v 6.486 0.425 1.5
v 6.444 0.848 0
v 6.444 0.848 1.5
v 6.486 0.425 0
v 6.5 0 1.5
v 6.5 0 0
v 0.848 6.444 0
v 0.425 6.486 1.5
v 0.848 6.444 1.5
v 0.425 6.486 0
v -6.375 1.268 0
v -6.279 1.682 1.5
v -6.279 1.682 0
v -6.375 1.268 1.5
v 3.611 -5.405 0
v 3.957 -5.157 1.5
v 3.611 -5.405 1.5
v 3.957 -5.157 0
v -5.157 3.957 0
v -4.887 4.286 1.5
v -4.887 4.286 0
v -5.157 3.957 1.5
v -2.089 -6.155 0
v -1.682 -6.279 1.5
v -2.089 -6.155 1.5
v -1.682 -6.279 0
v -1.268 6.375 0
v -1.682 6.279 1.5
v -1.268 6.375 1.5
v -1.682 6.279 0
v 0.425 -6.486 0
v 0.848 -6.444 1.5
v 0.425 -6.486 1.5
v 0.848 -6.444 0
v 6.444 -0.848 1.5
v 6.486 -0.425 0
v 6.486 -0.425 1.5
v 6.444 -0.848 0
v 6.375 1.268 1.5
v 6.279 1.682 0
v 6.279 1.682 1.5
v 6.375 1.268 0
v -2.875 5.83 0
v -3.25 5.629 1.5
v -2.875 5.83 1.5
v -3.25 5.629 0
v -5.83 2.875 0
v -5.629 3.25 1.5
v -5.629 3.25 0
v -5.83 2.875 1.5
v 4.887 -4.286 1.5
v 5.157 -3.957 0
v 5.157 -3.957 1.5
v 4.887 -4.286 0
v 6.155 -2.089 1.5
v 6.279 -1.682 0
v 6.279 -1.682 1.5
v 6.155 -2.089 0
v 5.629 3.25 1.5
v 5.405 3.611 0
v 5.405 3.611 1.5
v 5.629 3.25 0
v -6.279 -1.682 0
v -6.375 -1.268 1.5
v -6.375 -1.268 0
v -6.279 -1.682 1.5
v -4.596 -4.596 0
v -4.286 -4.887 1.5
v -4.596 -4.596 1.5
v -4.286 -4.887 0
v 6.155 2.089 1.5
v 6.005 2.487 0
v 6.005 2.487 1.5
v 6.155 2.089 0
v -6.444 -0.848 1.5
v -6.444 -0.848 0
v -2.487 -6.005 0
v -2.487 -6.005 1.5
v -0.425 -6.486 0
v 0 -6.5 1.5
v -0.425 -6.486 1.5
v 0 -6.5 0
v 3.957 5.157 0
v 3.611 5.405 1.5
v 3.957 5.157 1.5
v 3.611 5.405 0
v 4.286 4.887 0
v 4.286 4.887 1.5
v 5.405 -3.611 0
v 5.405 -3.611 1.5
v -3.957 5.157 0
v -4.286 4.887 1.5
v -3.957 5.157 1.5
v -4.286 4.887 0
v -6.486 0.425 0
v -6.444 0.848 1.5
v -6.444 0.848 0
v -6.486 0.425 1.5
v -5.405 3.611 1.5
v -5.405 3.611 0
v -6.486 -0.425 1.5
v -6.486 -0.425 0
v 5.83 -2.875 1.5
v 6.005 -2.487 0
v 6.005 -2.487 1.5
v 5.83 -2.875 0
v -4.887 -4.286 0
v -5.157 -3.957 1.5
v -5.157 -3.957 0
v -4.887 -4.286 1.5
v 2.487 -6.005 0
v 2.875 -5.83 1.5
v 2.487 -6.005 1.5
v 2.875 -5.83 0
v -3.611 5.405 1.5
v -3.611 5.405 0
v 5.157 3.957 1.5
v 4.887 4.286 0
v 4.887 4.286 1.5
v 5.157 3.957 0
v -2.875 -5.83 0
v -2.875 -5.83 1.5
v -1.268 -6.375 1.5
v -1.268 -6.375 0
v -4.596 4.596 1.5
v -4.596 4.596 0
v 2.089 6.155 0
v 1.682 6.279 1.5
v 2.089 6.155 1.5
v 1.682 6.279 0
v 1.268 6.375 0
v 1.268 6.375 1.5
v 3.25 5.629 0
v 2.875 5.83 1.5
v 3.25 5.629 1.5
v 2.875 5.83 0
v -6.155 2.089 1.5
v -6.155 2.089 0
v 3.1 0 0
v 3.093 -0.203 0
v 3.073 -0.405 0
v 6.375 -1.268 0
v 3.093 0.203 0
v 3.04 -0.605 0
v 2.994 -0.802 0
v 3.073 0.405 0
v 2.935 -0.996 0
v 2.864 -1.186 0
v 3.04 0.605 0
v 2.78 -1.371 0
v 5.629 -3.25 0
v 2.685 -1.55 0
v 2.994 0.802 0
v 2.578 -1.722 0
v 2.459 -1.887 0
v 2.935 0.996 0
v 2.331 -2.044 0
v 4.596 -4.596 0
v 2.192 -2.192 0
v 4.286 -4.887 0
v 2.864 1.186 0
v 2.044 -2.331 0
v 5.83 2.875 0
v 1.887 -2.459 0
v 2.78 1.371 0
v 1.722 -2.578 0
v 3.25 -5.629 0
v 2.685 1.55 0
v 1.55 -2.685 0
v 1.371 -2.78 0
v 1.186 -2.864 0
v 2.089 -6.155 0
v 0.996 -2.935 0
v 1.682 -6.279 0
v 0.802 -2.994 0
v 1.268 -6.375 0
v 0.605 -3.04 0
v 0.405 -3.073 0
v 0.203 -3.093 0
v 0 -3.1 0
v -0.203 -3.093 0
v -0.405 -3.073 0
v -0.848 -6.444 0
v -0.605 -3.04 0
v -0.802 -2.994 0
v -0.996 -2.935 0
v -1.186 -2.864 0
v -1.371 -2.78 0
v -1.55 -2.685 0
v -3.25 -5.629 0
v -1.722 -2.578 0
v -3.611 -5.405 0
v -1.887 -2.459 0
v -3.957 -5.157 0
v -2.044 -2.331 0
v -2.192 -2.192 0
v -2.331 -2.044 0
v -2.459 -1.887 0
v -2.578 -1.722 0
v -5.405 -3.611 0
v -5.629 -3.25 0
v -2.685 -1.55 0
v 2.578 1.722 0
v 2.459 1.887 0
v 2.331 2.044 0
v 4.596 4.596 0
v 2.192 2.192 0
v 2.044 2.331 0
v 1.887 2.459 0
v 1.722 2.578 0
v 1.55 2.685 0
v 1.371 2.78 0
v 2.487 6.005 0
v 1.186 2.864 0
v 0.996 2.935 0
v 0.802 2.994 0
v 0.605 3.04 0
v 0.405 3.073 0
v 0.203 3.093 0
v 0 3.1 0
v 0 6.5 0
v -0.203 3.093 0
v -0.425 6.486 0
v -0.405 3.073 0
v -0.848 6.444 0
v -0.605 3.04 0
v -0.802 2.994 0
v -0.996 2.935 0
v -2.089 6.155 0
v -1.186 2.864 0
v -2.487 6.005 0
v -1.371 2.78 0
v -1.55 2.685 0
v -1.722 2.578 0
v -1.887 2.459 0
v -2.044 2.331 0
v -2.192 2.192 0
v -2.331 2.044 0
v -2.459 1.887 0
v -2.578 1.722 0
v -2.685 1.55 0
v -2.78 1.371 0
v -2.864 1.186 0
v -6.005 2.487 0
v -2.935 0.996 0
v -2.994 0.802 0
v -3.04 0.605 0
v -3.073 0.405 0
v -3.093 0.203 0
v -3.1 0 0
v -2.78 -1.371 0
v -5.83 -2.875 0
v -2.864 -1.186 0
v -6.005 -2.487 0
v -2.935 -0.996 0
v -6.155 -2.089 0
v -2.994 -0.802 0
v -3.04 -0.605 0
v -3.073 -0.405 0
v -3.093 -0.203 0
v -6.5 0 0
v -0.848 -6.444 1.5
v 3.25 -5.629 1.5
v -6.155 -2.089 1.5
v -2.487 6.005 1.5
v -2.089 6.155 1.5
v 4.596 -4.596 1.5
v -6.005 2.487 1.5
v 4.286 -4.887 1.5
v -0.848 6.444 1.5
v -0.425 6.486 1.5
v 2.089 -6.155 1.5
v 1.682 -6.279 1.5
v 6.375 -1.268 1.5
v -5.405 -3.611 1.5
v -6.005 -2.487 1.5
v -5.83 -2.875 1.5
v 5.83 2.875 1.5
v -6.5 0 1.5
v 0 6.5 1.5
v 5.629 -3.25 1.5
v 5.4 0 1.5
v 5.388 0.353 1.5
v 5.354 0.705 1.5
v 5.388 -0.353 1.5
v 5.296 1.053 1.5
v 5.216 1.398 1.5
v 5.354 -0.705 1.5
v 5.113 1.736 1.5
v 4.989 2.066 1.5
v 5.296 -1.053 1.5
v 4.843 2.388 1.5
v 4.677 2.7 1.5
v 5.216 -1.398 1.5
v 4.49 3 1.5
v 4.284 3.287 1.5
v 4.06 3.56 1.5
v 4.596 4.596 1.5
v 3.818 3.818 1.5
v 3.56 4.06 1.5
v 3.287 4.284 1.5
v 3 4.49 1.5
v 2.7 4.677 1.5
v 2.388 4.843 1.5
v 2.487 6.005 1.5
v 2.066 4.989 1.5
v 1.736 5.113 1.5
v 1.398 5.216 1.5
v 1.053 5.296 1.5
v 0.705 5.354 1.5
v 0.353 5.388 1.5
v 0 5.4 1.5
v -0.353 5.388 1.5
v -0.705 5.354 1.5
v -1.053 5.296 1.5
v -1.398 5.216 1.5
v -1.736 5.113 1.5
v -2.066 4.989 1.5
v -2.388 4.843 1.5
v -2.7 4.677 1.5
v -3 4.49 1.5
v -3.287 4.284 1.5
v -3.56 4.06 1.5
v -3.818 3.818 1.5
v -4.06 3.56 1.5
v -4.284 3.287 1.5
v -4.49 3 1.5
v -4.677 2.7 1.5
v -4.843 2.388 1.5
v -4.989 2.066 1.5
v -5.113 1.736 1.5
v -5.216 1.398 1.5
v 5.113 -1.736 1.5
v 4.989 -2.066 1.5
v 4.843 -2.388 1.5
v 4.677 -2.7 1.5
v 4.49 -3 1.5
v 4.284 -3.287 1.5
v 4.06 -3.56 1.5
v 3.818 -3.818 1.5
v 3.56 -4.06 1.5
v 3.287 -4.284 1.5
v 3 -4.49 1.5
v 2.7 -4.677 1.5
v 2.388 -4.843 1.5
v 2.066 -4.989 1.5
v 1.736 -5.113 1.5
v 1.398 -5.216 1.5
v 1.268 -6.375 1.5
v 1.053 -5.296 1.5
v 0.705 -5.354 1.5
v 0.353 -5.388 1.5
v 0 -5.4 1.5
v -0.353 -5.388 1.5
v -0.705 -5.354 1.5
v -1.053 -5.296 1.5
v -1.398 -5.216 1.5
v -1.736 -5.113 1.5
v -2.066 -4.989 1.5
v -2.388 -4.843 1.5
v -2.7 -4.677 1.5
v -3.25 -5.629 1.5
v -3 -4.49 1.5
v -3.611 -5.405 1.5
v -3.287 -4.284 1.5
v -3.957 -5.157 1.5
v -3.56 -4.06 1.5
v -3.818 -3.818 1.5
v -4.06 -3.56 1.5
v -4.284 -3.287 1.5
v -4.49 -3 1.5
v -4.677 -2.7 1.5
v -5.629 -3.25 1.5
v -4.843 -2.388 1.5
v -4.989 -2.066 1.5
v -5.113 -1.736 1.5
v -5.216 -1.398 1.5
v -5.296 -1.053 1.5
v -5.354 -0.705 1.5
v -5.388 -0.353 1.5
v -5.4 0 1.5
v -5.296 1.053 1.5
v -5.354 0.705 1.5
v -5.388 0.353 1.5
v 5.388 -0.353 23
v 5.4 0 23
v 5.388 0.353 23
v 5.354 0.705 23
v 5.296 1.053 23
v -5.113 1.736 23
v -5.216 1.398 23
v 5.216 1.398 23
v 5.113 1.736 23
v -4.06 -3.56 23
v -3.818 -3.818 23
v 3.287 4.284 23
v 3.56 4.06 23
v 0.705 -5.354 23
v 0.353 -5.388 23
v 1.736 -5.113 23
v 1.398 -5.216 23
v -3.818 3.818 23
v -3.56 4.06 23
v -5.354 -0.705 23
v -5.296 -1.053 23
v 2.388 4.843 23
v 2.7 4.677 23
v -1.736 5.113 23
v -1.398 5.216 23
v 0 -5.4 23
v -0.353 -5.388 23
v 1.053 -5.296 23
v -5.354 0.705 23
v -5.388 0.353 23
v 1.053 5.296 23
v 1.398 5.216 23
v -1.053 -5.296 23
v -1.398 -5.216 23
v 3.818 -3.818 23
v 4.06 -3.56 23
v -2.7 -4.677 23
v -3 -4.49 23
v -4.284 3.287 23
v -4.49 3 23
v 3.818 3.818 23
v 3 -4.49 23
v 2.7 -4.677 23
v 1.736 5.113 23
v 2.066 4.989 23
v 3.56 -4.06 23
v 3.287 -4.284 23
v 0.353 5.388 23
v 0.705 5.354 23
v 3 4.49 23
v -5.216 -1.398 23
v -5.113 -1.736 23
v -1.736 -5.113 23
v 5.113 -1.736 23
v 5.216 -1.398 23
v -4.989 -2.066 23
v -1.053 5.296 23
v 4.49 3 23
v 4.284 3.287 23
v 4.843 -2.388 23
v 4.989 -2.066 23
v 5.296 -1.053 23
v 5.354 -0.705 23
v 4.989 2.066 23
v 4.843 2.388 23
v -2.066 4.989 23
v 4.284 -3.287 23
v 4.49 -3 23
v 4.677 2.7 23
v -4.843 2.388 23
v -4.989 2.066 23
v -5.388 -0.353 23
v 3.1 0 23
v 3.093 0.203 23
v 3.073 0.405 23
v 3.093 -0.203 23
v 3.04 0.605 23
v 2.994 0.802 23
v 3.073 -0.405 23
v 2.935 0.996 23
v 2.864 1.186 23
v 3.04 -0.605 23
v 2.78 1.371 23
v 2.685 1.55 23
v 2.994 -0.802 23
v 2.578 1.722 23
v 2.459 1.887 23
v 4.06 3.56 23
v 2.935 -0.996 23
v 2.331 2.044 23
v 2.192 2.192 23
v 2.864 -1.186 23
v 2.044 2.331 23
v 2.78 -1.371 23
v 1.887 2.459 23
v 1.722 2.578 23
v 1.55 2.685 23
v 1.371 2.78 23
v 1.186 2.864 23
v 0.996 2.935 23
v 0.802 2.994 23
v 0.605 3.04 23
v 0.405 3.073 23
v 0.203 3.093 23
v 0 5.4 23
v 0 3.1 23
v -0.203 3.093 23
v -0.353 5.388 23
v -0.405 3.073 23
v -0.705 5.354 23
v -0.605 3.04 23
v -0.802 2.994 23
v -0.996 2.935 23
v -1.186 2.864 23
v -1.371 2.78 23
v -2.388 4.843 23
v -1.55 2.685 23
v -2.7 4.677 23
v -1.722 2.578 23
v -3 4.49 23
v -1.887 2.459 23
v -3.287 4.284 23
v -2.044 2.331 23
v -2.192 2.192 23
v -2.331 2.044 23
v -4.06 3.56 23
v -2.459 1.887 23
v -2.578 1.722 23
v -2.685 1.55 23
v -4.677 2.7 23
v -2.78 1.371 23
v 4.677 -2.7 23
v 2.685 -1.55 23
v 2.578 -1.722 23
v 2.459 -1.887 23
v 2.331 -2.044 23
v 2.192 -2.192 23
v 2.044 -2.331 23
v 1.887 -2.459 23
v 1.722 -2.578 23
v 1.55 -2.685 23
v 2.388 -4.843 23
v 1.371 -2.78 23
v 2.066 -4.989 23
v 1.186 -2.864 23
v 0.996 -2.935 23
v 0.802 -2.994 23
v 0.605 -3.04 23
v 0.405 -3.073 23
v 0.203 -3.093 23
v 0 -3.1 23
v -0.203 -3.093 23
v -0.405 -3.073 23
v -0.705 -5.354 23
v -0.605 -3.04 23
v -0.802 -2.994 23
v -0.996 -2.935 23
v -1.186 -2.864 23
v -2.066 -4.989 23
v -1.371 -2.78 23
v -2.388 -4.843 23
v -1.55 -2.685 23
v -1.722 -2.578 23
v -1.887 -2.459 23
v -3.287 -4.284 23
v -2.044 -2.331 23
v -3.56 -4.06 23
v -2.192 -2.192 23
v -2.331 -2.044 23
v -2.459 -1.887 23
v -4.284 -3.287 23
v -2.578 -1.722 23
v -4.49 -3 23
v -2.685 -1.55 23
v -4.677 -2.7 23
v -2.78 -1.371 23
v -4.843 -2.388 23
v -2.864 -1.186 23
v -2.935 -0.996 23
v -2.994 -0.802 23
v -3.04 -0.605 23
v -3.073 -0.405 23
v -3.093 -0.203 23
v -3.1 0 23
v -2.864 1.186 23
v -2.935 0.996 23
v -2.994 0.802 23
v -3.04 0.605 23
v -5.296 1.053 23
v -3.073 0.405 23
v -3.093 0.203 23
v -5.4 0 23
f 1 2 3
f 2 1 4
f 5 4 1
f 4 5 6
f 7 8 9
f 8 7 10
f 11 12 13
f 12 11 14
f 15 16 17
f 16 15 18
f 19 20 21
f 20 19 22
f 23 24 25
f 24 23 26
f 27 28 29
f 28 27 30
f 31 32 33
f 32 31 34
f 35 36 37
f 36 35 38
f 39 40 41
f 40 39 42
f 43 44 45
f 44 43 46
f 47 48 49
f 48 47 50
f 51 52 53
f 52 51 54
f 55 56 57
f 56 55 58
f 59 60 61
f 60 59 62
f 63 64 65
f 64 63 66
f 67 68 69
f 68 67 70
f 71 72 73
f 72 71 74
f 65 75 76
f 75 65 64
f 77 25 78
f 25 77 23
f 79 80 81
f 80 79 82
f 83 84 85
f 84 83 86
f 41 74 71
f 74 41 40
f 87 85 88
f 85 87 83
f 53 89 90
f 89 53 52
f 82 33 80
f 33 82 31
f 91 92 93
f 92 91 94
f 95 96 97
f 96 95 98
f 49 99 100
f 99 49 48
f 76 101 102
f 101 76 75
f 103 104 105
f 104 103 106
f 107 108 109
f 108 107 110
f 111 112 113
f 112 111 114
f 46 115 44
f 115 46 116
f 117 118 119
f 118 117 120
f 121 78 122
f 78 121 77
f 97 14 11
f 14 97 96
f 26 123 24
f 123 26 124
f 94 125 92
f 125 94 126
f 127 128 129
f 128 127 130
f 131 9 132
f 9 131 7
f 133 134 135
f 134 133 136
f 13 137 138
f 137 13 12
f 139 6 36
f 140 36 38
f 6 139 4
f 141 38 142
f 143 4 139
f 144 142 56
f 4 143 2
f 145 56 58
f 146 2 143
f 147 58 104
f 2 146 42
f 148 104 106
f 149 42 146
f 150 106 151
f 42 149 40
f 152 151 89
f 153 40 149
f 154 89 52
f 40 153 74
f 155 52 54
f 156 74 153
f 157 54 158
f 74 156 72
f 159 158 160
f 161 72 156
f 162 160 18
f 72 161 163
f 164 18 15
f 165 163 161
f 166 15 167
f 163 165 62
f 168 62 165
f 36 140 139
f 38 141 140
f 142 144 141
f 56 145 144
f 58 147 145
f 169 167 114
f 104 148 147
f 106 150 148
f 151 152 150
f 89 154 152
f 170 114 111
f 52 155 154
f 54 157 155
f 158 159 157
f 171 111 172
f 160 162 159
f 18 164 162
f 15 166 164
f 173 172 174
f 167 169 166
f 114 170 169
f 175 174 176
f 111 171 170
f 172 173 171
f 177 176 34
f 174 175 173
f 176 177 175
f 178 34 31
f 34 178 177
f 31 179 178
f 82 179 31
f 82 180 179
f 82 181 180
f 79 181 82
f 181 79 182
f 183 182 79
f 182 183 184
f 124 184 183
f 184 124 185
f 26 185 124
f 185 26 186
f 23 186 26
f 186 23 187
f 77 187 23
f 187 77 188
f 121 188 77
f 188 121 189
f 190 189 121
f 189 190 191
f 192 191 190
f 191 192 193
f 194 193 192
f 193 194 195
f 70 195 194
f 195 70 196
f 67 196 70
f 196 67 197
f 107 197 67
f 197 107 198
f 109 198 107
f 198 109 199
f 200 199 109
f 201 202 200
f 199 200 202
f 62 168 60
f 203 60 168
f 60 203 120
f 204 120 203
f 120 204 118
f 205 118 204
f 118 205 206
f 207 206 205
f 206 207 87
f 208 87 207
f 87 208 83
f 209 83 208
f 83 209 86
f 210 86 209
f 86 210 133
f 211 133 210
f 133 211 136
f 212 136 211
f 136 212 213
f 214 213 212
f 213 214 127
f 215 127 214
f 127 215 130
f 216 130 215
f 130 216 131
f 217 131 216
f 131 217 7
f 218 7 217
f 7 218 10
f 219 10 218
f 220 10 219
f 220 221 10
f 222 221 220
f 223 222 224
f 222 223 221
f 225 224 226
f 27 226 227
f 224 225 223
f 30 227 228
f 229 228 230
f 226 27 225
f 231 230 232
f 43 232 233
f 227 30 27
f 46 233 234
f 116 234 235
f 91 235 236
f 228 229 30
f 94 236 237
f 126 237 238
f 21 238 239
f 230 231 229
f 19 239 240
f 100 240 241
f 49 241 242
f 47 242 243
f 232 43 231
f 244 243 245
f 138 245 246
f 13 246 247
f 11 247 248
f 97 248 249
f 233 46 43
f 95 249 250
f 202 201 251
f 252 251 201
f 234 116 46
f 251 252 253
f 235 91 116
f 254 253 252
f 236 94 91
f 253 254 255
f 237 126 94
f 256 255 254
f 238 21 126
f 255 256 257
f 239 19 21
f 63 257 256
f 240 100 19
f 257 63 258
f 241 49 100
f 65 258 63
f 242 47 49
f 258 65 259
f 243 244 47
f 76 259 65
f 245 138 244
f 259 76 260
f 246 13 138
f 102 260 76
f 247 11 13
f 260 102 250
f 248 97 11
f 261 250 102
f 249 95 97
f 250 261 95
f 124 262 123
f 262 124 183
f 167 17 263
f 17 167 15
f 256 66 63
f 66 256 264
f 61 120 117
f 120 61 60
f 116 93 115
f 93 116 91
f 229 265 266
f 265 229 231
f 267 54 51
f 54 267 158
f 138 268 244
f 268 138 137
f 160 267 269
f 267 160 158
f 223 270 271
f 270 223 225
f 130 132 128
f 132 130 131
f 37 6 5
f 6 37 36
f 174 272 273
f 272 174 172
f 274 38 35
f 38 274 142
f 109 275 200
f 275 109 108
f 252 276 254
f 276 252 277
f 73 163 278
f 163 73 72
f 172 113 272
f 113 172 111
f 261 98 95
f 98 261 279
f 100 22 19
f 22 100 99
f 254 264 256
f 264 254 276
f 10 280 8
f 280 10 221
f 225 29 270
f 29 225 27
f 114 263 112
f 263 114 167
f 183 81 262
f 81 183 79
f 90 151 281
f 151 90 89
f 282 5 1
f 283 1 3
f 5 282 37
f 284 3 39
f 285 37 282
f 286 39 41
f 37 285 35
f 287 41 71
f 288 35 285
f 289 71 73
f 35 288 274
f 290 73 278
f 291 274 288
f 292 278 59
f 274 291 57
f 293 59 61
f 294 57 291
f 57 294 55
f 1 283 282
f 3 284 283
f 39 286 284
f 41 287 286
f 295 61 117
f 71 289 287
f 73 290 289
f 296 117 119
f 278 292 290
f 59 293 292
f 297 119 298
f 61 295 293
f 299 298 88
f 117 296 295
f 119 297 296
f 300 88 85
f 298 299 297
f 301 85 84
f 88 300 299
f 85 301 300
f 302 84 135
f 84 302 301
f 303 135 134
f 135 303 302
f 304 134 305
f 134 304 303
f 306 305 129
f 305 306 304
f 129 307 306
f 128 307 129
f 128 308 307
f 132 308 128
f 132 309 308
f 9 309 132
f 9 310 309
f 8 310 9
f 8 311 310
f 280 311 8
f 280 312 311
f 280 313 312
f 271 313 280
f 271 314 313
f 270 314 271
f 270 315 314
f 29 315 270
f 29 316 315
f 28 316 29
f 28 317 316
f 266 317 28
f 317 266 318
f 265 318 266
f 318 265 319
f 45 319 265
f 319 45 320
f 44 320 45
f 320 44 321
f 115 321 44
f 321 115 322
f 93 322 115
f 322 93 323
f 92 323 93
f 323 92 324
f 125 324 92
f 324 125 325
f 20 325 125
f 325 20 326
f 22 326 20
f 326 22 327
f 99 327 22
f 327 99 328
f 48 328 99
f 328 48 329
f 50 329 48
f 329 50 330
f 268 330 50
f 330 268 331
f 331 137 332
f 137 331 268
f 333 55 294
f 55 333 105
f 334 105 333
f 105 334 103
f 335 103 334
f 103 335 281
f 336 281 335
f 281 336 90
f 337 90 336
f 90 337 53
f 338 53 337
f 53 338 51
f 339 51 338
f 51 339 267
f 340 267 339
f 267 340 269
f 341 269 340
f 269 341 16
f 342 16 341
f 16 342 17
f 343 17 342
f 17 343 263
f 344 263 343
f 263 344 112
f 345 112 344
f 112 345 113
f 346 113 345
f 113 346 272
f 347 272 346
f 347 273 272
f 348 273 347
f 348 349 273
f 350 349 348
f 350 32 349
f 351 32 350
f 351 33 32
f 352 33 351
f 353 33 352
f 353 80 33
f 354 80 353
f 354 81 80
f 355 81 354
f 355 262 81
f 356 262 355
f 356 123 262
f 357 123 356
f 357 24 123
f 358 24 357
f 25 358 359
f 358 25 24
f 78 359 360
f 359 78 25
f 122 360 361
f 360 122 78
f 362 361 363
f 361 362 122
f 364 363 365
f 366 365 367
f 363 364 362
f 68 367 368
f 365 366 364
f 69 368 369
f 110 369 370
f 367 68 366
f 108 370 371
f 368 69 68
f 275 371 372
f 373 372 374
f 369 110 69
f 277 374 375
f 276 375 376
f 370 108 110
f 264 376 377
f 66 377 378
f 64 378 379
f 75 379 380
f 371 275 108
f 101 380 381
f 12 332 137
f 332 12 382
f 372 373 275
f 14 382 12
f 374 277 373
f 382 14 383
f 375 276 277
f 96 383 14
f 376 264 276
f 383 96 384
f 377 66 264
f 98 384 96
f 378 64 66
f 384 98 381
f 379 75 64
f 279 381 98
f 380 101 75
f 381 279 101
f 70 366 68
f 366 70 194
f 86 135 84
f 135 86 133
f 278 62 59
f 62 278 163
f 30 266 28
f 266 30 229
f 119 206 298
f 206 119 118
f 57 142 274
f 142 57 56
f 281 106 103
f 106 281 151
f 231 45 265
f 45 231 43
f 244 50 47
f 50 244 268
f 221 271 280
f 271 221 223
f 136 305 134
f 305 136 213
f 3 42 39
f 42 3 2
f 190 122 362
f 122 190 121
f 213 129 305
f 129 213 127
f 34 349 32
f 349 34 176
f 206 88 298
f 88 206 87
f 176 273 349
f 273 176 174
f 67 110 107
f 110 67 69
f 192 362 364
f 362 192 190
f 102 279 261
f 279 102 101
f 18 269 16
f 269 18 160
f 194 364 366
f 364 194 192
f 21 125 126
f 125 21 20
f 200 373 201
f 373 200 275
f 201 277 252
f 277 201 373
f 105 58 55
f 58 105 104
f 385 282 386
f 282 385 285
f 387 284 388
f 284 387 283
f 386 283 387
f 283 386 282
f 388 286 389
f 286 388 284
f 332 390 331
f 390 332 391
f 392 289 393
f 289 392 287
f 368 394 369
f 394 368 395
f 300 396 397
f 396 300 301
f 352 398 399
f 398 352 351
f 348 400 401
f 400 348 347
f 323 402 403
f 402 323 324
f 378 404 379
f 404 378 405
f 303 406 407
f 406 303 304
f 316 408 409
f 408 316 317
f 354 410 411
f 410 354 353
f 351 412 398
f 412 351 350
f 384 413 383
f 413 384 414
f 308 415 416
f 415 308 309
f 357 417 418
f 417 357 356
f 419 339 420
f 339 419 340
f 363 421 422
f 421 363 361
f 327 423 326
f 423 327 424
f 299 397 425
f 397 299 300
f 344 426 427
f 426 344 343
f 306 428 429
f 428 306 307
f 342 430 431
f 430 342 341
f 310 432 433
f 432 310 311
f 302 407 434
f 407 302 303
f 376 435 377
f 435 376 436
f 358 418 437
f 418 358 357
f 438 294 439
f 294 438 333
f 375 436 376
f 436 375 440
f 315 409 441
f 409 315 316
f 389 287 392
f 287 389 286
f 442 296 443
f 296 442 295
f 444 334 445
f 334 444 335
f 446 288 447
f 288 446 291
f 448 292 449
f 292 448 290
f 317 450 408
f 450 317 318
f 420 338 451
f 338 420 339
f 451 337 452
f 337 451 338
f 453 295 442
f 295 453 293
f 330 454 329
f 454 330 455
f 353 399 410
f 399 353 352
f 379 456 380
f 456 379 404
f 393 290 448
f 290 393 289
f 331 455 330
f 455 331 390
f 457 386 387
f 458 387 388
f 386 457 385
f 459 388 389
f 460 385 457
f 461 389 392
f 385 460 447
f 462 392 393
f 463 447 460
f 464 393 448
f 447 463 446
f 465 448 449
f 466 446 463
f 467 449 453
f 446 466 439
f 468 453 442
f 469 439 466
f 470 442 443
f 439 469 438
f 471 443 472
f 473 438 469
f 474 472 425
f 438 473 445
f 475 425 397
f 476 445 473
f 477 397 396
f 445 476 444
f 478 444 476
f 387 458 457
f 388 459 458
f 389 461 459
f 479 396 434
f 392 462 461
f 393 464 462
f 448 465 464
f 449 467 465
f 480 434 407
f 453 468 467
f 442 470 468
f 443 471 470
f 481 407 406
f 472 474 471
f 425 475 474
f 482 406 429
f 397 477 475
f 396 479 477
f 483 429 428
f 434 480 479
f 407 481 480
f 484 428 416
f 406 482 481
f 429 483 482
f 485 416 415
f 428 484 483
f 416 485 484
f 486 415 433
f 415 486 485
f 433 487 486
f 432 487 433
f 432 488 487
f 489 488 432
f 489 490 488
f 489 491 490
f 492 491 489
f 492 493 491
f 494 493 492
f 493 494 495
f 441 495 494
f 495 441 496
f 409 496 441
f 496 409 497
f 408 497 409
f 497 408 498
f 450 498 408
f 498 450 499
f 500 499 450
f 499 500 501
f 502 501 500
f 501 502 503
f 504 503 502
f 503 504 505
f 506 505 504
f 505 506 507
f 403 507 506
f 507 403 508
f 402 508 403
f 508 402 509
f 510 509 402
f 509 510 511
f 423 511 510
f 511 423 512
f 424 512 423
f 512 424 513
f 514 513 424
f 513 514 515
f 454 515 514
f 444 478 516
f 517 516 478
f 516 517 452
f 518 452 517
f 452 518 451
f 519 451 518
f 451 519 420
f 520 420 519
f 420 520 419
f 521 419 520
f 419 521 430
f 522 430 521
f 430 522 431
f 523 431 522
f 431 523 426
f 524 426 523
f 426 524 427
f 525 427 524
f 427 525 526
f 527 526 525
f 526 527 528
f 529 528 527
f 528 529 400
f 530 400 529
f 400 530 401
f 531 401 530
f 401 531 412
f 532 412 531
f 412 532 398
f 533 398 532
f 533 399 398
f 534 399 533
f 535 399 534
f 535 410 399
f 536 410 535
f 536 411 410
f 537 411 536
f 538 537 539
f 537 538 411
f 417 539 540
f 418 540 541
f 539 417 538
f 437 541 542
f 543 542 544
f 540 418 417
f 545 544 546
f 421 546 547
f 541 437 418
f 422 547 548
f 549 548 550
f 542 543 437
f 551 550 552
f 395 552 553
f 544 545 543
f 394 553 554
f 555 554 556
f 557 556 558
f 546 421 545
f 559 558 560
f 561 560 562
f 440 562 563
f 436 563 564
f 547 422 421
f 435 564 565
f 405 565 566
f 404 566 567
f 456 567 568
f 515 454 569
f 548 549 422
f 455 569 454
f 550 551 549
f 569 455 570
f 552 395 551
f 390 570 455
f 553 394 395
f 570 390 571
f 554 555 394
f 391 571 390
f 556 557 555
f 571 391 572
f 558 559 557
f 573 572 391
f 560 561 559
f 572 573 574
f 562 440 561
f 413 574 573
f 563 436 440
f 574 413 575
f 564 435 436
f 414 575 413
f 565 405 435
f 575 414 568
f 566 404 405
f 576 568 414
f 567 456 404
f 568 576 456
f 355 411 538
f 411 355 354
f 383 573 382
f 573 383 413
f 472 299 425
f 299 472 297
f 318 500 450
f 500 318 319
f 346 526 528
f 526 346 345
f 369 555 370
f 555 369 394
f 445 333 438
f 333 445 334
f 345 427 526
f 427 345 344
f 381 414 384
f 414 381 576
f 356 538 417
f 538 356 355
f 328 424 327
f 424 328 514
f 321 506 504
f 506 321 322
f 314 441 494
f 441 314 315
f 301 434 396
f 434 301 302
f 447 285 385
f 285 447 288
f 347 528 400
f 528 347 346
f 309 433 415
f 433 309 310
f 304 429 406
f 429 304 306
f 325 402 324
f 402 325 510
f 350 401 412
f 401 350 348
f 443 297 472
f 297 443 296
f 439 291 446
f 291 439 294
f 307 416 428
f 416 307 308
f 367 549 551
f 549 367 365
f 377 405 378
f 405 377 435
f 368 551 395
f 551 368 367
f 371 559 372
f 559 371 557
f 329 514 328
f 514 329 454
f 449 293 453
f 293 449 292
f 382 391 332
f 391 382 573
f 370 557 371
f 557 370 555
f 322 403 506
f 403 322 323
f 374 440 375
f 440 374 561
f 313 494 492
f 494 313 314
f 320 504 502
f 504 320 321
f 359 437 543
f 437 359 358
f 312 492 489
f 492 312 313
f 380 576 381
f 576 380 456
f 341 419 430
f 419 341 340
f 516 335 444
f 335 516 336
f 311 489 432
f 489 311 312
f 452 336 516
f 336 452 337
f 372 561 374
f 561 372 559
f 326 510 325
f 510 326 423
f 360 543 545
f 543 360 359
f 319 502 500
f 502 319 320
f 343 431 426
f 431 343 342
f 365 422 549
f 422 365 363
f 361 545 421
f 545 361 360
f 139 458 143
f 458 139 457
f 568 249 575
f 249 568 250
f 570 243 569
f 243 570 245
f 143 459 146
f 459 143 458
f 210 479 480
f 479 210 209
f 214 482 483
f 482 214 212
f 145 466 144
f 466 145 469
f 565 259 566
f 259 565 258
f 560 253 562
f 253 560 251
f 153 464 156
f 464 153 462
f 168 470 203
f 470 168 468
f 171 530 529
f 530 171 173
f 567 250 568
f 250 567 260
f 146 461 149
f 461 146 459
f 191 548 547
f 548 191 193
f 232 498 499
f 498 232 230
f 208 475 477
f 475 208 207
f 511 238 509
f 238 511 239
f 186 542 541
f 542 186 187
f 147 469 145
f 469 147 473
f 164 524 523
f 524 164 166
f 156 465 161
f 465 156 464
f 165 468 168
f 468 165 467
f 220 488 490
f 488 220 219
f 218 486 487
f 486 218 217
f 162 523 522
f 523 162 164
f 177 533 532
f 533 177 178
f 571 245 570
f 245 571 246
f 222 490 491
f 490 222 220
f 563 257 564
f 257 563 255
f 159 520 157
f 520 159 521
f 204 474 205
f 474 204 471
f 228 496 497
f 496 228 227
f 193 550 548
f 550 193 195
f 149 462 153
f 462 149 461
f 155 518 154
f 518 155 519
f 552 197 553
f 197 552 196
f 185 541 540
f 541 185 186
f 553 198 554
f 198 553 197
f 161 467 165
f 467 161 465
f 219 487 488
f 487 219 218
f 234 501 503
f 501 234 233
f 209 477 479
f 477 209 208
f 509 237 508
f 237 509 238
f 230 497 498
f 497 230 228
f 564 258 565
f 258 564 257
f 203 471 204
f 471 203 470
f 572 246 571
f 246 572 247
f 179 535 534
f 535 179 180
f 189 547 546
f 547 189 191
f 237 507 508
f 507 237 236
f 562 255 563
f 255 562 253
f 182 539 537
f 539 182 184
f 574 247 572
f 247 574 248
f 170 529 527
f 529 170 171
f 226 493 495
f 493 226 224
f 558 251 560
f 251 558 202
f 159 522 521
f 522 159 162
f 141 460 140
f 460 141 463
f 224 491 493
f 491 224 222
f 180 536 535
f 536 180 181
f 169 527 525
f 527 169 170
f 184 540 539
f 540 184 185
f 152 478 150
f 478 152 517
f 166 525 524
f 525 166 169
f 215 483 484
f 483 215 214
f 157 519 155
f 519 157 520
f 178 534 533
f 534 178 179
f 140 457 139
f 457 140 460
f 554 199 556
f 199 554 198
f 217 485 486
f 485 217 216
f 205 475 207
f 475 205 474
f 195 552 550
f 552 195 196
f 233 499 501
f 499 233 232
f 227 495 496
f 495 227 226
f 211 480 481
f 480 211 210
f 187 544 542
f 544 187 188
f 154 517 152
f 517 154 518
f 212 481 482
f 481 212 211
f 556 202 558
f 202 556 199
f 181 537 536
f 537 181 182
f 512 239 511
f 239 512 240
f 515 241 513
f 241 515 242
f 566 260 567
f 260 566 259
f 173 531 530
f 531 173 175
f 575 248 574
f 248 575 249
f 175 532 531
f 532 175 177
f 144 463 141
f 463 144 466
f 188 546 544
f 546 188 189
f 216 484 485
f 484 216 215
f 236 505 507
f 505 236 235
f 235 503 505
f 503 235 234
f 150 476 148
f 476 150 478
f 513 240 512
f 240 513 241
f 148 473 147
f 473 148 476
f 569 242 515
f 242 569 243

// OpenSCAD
// PCR tube adapter sleeve: fits in a 1.5 mL rack hole, cradles a 0.2 mL tube
// Print orientation: collar on the bed (z = 0 to 1.5), sleeve body rises to z = 21.5

$fn = 96;

// ---- Dimensions (mm) ----
collar_d      = 13;    // collar outer diameter
collar_h      = 1.5;   // collar thickness (z = 0 to 1.5)
sleeve_od     = 10.8;  // sleeve body outer diameter
sleeve_top_z  = 21.5;  // top of sleeve body (absolute Z)
bore_d        = 6.2;   // through-bore diameter
eps           = 0.5;   // cutter overshoot past faces

total_h = sleeve_top_z - 0 + collar_h;  // overall height (23.0 mm)

difference() {
    union() {
        // Collar
        cylinder(d = collar_d, h = collar_h);
        // Sleeve body (overlaps slightly into collar for a clean union)
        translate([0, 0, collar_h - 0.01])
            cylinder(d = sleeve_od, h = total_h - collar_h + 0.01);
    }
    // Through-bore
    translate([0, 0, -eps])
        cylinder(d = bore_d, h = total_h + 2 * eps);
}
